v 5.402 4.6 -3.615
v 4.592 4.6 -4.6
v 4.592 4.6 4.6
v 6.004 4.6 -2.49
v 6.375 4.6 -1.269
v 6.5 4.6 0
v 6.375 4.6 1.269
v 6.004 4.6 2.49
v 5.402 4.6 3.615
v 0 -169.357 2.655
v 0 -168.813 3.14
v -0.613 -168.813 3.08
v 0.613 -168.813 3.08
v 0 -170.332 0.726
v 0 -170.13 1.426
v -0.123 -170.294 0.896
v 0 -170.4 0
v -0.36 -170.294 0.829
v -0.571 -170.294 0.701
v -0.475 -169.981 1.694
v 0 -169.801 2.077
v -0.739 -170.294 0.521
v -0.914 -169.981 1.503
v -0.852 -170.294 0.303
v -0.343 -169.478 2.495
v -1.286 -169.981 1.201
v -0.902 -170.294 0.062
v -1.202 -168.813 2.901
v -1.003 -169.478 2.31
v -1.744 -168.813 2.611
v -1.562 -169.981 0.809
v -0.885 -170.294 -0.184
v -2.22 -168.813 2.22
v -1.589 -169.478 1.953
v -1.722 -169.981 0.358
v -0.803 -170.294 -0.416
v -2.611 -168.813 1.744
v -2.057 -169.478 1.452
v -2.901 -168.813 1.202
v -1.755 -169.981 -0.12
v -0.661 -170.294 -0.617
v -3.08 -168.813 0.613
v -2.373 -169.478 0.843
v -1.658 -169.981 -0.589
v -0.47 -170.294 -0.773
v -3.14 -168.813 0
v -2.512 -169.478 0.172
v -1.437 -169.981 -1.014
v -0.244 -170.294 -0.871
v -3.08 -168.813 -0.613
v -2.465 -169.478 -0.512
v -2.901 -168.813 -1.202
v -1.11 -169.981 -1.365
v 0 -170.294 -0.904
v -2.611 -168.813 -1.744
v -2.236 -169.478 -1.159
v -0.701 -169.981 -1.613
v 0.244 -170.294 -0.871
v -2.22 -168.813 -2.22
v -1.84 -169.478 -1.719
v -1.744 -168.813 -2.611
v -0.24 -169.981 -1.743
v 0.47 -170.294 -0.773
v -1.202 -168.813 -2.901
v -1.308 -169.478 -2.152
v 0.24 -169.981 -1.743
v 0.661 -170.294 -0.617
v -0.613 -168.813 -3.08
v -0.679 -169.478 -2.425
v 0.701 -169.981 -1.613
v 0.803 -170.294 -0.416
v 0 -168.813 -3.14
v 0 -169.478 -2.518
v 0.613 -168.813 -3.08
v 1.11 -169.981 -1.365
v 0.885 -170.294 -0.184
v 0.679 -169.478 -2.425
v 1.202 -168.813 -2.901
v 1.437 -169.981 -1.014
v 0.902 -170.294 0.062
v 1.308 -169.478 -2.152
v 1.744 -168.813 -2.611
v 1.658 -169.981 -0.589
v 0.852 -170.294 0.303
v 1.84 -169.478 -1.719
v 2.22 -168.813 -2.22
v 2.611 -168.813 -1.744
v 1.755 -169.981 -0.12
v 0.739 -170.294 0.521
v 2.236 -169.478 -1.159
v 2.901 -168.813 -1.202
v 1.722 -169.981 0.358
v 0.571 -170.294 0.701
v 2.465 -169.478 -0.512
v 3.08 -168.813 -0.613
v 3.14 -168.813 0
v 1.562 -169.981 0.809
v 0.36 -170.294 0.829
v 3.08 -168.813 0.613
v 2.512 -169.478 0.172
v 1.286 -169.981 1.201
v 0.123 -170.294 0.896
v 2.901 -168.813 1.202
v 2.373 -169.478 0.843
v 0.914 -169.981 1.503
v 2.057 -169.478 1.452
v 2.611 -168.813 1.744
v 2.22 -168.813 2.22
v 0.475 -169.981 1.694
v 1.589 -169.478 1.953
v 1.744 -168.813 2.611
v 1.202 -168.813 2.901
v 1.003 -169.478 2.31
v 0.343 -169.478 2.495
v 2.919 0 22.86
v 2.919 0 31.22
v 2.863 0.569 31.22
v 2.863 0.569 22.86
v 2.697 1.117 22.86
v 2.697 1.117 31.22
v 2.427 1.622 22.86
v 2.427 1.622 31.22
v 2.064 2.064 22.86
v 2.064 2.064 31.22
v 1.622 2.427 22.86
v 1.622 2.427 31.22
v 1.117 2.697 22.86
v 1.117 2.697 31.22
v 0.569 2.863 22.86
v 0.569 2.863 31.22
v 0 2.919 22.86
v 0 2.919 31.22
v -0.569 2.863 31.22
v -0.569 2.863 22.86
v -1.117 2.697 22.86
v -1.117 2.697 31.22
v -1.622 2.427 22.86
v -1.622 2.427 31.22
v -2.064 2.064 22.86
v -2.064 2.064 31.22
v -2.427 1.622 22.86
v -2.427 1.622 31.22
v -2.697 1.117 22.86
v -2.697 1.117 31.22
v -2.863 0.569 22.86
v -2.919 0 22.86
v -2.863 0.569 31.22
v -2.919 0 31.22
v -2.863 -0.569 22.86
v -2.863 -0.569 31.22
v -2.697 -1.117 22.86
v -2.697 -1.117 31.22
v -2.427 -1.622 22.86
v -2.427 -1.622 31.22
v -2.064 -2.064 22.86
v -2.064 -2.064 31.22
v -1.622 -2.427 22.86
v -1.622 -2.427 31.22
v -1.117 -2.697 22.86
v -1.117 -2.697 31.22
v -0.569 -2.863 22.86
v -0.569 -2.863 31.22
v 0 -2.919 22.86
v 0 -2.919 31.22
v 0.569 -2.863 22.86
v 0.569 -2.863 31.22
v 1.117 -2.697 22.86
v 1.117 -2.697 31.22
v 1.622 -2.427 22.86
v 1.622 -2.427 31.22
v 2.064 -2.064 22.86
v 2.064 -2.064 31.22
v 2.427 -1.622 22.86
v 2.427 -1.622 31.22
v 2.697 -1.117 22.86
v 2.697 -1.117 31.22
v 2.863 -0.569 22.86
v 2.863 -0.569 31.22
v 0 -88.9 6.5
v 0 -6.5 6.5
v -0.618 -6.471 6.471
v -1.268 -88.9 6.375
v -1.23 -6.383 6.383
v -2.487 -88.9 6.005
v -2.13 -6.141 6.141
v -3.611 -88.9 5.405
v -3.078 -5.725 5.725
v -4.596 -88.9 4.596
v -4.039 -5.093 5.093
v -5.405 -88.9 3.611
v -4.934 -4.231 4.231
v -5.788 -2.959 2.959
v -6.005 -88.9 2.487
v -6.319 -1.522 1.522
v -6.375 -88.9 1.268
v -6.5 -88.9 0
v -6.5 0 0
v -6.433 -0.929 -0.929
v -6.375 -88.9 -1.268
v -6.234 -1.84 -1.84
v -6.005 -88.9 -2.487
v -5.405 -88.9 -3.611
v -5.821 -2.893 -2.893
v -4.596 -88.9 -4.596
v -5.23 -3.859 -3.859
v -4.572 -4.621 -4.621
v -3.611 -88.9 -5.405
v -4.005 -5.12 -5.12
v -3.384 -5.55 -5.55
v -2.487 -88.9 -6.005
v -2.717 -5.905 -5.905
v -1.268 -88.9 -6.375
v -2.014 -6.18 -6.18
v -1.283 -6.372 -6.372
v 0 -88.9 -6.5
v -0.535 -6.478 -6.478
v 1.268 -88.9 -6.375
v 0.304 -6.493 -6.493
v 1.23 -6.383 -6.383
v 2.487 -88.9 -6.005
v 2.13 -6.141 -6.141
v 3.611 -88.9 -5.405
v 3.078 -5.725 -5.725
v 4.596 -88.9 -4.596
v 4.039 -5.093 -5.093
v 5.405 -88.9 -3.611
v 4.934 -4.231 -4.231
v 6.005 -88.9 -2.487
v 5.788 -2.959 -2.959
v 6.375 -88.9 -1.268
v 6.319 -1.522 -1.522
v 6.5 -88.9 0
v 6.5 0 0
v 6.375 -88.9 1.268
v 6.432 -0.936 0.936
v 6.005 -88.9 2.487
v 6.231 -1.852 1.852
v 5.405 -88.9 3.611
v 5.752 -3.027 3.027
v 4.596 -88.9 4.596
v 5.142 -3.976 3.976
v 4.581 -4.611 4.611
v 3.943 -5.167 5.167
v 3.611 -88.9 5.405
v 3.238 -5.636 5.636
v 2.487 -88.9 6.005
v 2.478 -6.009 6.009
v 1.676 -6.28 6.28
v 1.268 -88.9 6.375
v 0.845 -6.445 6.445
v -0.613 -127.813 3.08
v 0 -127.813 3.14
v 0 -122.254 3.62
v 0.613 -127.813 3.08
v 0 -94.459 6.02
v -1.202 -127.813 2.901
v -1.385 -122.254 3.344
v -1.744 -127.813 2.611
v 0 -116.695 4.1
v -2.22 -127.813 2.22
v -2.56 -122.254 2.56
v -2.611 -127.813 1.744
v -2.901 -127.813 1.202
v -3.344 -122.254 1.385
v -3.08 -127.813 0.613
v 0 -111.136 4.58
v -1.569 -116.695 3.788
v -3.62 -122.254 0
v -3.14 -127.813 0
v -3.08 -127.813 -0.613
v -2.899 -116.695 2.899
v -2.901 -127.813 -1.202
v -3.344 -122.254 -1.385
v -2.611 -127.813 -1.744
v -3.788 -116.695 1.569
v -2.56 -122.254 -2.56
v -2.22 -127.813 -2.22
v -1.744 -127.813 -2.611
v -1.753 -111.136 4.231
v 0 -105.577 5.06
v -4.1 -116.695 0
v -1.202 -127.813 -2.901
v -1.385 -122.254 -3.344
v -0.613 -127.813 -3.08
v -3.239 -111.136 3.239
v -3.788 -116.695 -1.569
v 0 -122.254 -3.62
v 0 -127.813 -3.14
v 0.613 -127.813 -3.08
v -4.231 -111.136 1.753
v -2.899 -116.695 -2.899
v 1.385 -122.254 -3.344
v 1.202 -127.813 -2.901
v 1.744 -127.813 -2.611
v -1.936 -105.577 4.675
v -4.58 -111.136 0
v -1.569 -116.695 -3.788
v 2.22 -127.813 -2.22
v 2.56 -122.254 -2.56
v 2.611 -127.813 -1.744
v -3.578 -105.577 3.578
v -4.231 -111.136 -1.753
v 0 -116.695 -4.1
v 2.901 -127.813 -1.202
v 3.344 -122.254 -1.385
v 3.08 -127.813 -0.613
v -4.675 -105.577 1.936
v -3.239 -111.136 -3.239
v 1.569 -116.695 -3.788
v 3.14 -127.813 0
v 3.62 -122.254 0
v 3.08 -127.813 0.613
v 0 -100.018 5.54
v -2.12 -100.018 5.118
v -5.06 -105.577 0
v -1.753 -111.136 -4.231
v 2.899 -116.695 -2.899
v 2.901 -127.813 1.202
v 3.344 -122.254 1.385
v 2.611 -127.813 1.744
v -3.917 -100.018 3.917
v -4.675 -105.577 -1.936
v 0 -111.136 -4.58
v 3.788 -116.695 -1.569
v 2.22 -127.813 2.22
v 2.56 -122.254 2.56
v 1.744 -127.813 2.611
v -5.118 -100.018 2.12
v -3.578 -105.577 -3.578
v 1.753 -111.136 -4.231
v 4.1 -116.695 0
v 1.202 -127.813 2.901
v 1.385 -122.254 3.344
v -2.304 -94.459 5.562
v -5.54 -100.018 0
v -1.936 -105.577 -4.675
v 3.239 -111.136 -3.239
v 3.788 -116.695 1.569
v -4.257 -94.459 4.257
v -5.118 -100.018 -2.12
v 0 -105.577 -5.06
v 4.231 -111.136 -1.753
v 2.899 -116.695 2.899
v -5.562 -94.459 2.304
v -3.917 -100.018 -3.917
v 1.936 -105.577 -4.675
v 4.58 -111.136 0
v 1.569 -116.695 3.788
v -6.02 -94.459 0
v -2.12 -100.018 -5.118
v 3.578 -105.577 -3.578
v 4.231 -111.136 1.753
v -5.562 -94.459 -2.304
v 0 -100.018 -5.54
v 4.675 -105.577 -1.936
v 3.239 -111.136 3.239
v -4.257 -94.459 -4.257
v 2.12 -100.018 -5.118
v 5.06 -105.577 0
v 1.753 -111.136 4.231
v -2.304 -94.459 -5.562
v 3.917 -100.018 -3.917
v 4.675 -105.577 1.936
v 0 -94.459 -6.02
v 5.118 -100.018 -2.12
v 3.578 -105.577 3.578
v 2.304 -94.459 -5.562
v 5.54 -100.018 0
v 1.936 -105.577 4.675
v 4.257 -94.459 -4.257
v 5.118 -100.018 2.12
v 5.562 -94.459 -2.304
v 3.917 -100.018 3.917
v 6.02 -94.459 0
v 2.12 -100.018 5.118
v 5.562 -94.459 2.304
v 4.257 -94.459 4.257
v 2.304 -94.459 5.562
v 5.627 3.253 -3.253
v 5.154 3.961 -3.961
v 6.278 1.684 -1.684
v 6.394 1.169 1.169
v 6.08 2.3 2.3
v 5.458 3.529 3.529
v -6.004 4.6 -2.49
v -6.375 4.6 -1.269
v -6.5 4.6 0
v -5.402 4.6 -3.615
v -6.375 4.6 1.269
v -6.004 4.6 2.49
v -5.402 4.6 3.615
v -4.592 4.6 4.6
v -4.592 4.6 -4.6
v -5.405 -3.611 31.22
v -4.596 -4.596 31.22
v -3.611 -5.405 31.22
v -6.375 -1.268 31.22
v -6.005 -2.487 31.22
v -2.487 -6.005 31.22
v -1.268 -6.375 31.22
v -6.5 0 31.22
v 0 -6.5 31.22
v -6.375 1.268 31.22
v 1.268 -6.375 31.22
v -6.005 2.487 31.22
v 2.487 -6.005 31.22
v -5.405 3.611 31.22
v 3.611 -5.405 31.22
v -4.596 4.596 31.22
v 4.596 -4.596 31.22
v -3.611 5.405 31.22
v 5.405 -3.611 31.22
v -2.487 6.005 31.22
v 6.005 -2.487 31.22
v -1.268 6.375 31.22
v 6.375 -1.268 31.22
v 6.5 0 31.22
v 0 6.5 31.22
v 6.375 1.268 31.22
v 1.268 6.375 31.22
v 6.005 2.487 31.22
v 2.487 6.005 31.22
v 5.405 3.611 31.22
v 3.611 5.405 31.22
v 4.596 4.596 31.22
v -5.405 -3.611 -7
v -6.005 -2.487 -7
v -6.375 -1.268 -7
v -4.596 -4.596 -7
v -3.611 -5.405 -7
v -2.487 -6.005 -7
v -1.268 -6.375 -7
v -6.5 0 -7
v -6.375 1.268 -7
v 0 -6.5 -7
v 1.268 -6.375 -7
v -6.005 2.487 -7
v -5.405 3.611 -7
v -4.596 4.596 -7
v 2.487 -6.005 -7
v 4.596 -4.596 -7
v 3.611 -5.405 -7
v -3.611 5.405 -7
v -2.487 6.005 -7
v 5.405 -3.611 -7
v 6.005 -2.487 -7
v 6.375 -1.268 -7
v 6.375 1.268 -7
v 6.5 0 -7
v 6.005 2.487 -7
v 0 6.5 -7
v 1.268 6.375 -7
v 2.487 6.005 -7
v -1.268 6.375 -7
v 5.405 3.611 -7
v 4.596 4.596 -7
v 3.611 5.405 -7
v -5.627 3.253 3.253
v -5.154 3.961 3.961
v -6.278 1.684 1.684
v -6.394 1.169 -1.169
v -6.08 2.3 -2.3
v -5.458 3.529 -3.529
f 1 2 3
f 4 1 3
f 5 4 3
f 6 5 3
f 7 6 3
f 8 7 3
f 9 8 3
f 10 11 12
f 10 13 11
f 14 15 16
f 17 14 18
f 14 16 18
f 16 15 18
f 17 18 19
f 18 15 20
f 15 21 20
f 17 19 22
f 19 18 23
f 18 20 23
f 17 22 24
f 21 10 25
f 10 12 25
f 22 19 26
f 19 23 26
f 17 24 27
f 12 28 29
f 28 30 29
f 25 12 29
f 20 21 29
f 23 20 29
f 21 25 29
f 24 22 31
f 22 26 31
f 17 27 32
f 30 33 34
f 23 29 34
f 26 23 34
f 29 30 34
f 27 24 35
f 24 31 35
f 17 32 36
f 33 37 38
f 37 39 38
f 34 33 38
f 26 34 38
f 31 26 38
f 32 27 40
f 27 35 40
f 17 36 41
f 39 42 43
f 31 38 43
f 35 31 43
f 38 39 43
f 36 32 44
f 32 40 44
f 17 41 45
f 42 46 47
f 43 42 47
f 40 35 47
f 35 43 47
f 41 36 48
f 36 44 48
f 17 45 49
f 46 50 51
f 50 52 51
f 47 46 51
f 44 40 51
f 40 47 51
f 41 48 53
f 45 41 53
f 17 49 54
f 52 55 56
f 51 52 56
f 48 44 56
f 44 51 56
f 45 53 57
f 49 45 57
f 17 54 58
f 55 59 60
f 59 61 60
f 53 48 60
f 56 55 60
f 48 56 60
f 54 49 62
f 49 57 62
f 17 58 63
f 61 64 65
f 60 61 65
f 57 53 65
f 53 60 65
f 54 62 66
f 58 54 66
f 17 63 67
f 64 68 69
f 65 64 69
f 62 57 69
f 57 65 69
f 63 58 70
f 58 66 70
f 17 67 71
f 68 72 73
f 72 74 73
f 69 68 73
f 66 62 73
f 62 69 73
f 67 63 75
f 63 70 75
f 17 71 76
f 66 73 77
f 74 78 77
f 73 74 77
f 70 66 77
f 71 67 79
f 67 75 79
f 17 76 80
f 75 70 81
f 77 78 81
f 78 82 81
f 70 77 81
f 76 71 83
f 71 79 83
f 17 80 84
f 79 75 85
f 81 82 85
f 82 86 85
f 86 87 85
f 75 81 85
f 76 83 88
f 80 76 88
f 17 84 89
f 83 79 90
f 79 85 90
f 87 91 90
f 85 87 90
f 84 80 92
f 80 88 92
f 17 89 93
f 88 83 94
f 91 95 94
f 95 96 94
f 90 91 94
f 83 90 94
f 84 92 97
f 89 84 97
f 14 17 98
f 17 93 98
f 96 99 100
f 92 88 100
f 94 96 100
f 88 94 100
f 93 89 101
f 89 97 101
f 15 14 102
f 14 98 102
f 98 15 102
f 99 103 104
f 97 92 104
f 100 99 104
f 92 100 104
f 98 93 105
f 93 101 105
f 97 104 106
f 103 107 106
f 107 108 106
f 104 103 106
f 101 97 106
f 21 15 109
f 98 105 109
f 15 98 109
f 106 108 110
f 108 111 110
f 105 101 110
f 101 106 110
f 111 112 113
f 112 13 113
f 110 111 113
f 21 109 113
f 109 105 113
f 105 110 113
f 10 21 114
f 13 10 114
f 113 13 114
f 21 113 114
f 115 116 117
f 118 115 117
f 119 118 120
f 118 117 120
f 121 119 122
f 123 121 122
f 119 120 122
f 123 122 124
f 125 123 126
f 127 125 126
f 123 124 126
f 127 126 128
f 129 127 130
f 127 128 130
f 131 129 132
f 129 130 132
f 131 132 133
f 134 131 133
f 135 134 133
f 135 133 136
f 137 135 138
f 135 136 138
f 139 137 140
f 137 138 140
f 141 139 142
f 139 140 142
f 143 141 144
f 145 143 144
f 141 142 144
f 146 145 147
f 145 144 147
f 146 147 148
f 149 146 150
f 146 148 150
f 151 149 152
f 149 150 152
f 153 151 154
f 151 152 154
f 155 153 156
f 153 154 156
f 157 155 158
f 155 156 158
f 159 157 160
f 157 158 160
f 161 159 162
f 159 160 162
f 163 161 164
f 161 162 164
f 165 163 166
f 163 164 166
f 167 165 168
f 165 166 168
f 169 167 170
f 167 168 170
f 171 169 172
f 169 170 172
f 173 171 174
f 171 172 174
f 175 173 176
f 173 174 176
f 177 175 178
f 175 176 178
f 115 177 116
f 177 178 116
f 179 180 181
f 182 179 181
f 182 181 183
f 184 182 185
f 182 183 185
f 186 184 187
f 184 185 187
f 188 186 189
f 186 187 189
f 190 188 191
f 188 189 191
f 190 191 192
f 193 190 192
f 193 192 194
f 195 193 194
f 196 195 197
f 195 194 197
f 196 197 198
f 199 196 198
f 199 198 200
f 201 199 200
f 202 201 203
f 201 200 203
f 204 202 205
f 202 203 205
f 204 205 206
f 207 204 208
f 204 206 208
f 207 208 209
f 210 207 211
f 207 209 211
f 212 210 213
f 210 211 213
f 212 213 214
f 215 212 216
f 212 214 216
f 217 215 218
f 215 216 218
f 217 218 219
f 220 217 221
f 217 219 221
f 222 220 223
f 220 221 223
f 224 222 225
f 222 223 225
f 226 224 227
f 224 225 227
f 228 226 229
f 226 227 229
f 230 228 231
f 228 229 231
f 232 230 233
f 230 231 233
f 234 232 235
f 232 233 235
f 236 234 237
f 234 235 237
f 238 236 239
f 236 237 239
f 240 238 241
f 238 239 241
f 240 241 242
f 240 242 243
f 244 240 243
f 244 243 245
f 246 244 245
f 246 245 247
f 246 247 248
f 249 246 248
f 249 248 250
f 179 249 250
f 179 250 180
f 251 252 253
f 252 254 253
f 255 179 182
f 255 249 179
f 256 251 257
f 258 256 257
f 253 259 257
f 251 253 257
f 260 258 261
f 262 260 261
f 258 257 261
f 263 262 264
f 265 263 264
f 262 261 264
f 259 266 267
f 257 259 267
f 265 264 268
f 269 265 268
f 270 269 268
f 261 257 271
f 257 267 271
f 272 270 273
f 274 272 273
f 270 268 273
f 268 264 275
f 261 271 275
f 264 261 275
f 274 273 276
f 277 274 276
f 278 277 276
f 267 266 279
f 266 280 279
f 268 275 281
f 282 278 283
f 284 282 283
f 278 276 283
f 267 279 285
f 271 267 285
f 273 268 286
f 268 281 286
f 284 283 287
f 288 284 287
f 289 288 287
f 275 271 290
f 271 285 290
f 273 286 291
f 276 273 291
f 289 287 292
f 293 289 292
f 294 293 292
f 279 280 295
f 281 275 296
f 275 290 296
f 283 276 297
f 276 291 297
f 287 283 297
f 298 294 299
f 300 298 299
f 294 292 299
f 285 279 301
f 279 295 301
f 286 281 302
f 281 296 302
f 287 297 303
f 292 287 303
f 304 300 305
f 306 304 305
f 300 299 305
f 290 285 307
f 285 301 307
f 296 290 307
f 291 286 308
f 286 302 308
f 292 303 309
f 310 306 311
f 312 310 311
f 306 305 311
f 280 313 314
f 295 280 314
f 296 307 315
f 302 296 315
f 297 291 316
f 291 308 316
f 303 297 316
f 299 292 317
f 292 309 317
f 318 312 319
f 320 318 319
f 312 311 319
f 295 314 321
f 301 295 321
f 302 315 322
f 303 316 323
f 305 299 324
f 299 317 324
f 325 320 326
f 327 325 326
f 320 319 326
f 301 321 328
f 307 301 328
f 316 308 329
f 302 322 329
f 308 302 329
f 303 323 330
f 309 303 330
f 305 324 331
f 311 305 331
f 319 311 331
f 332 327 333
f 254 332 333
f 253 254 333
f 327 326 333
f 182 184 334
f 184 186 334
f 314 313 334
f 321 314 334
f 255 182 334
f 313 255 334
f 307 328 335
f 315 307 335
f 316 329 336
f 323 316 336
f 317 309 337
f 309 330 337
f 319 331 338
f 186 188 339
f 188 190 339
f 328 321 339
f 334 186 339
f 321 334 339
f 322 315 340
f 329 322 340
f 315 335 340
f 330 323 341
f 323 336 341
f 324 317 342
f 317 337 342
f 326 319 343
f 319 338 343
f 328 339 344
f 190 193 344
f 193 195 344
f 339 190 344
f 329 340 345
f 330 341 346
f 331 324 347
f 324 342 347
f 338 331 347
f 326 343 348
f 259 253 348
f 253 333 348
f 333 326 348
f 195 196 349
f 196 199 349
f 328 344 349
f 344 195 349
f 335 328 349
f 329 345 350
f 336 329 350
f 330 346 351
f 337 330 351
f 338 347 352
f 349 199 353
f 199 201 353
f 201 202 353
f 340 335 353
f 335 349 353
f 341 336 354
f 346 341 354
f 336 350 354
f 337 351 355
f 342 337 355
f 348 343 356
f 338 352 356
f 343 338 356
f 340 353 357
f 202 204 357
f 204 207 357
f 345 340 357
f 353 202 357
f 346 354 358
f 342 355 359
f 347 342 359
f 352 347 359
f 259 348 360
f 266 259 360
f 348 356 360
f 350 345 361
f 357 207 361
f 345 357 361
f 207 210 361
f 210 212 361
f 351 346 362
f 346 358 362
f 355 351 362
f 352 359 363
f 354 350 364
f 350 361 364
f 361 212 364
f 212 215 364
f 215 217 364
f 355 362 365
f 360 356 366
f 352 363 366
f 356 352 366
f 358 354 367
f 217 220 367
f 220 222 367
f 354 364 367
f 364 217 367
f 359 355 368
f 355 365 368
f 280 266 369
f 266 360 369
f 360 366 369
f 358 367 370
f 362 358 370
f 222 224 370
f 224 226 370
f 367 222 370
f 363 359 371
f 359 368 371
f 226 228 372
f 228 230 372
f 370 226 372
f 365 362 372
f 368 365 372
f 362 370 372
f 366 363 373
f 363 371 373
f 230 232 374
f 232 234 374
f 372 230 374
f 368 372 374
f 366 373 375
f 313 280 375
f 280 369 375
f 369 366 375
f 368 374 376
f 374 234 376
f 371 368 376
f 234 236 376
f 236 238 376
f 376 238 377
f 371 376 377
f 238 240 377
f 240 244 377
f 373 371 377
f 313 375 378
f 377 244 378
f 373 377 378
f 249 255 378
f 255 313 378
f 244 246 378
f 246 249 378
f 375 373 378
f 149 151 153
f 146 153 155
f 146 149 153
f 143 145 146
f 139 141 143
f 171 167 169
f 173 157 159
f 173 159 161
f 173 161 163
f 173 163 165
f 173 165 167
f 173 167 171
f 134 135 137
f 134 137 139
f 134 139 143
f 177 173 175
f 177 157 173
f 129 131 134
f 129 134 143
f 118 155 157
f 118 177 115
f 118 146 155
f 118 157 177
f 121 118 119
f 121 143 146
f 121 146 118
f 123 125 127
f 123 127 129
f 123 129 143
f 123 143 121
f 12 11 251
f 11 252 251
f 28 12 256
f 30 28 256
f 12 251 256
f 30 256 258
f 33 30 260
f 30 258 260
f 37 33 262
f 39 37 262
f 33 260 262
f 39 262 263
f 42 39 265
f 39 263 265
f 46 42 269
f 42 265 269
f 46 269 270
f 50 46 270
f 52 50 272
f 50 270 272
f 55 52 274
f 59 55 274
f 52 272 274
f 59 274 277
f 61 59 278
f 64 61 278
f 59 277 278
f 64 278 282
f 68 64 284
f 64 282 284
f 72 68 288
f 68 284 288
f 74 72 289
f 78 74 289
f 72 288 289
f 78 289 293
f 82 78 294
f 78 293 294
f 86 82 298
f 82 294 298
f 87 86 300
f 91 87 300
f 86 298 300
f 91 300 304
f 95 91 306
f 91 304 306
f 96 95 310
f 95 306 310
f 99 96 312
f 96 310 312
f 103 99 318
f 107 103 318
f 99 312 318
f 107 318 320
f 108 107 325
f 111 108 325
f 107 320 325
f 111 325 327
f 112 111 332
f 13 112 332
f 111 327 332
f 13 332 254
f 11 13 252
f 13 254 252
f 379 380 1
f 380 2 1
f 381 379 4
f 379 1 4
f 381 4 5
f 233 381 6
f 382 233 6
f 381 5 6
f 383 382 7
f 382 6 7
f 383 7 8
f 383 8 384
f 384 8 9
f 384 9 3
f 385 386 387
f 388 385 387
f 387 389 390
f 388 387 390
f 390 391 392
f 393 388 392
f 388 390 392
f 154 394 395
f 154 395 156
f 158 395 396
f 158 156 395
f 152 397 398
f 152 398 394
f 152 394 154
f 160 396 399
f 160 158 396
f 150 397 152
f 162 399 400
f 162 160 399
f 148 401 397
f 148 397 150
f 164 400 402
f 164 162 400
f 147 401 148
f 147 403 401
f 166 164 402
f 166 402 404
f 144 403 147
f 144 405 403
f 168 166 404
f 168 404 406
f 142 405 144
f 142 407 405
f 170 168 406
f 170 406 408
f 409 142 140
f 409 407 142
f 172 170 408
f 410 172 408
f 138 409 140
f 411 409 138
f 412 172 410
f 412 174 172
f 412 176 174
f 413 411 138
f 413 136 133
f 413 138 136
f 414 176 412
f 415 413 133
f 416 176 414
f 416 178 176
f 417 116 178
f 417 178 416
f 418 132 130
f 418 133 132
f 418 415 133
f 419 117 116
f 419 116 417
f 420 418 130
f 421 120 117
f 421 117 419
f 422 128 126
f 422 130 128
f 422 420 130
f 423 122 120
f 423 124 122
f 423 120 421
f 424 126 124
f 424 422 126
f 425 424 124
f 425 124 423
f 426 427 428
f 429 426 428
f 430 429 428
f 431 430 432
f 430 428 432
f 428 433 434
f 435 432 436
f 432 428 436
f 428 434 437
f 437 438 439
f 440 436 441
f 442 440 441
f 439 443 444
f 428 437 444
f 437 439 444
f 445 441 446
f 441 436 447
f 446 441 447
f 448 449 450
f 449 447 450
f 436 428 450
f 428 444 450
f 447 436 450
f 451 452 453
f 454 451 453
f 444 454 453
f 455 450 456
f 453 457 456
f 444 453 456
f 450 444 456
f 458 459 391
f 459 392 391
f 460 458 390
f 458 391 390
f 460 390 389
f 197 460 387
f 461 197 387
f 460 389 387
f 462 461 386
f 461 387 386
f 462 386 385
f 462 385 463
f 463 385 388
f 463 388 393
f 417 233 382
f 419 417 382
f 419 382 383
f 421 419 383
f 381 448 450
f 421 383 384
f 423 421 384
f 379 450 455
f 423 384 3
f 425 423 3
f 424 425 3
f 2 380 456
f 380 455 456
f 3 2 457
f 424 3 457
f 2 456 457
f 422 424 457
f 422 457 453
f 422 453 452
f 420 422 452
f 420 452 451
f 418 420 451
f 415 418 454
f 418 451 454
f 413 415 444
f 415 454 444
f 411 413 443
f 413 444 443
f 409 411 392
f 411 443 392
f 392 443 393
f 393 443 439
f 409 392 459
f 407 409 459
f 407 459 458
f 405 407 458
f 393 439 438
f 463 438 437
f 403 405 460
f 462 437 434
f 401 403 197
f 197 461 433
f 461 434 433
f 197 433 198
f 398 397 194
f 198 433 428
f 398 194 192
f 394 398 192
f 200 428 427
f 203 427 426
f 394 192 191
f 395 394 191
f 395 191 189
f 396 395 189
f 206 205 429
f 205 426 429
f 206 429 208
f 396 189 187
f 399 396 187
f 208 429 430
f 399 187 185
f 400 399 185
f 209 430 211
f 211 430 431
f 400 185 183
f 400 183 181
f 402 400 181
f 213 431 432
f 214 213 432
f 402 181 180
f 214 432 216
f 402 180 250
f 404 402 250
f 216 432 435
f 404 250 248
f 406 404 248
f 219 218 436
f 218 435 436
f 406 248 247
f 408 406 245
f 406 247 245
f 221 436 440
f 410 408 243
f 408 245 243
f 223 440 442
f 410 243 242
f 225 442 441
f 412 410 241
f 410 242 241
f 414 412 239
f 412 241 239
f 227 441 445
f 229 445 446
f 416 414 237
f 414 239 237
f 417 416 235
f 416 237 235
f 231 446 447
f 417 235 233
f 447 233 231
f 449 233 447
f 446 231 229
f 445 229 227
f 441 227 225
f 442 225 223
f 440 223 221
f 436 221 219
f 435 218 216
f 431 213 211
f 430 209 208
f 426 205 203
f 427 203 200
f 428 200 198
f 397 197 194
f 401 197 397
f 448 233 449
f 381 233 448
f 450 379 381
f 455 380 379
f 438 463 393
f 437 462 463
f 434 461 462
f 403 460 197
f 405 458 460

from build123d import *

# Parameters (mm, degrees)
BOSS_EXTRUDE1_DEPTH      = 31.22
BOSS_EXTRUDE1_DEPTH_BACK = 7
SKETCH2_R                = 6.5
SKETCH3_R                = 2.918906714
CUT_EXTRUDE1_DEPTH       = 8.36


with BuildPart() as part:
    # Sketch1 → Revolve1 (revolve)
    with BuildSketch(Plane(origin=(0, 0, 0), x_dir=(0, 0, -1), z_dir=(1, 0, 0))):
        with BuildLine():
            Line((0, 4.6), (0, -170.4))
            ThreePointArc((0, -170.4), (-1.759110094, -169.980737232), (-3.14, -168.813093167))
            Line((-3.14, -168.813093167), (-3.14, -127.813093167))
            Line((-3.14, -127.813093167), (-6.5, -88.9))
            Line((-6.5, -88.9), (-6.5, 4.6))
            Line((-6.5, 4.6), (0, 4.6))
        make_face()
    revolve(axis=Axis((0, 4.6, 0), (0, -1, 0)))

    # Sketch2 → Boss-Extrude1 (add, two sides: drawn at the far end of the back side and taken through both)
    with BuildSketch(Plane.XY.offset(-BOSS_EXTRUDE1_DEPTH_BACK)):
        Circle(SKETCH2_R)
    extrude(amount=BOSS_EXTRUDE1_DEPTH + BOSS_EXTRUDE1_DEPTH_BACK)

    # Sketch3 → Cut-Extrude1 (cut)
    with BuildSketch(Plane.XY.offset(31.22)):
        Circle(SKETCH3_R)
    extrude(amount=-CUT_EXTRUDE1_DEPTH, mode=Mode.SUBTRACT)


solid = part.part
